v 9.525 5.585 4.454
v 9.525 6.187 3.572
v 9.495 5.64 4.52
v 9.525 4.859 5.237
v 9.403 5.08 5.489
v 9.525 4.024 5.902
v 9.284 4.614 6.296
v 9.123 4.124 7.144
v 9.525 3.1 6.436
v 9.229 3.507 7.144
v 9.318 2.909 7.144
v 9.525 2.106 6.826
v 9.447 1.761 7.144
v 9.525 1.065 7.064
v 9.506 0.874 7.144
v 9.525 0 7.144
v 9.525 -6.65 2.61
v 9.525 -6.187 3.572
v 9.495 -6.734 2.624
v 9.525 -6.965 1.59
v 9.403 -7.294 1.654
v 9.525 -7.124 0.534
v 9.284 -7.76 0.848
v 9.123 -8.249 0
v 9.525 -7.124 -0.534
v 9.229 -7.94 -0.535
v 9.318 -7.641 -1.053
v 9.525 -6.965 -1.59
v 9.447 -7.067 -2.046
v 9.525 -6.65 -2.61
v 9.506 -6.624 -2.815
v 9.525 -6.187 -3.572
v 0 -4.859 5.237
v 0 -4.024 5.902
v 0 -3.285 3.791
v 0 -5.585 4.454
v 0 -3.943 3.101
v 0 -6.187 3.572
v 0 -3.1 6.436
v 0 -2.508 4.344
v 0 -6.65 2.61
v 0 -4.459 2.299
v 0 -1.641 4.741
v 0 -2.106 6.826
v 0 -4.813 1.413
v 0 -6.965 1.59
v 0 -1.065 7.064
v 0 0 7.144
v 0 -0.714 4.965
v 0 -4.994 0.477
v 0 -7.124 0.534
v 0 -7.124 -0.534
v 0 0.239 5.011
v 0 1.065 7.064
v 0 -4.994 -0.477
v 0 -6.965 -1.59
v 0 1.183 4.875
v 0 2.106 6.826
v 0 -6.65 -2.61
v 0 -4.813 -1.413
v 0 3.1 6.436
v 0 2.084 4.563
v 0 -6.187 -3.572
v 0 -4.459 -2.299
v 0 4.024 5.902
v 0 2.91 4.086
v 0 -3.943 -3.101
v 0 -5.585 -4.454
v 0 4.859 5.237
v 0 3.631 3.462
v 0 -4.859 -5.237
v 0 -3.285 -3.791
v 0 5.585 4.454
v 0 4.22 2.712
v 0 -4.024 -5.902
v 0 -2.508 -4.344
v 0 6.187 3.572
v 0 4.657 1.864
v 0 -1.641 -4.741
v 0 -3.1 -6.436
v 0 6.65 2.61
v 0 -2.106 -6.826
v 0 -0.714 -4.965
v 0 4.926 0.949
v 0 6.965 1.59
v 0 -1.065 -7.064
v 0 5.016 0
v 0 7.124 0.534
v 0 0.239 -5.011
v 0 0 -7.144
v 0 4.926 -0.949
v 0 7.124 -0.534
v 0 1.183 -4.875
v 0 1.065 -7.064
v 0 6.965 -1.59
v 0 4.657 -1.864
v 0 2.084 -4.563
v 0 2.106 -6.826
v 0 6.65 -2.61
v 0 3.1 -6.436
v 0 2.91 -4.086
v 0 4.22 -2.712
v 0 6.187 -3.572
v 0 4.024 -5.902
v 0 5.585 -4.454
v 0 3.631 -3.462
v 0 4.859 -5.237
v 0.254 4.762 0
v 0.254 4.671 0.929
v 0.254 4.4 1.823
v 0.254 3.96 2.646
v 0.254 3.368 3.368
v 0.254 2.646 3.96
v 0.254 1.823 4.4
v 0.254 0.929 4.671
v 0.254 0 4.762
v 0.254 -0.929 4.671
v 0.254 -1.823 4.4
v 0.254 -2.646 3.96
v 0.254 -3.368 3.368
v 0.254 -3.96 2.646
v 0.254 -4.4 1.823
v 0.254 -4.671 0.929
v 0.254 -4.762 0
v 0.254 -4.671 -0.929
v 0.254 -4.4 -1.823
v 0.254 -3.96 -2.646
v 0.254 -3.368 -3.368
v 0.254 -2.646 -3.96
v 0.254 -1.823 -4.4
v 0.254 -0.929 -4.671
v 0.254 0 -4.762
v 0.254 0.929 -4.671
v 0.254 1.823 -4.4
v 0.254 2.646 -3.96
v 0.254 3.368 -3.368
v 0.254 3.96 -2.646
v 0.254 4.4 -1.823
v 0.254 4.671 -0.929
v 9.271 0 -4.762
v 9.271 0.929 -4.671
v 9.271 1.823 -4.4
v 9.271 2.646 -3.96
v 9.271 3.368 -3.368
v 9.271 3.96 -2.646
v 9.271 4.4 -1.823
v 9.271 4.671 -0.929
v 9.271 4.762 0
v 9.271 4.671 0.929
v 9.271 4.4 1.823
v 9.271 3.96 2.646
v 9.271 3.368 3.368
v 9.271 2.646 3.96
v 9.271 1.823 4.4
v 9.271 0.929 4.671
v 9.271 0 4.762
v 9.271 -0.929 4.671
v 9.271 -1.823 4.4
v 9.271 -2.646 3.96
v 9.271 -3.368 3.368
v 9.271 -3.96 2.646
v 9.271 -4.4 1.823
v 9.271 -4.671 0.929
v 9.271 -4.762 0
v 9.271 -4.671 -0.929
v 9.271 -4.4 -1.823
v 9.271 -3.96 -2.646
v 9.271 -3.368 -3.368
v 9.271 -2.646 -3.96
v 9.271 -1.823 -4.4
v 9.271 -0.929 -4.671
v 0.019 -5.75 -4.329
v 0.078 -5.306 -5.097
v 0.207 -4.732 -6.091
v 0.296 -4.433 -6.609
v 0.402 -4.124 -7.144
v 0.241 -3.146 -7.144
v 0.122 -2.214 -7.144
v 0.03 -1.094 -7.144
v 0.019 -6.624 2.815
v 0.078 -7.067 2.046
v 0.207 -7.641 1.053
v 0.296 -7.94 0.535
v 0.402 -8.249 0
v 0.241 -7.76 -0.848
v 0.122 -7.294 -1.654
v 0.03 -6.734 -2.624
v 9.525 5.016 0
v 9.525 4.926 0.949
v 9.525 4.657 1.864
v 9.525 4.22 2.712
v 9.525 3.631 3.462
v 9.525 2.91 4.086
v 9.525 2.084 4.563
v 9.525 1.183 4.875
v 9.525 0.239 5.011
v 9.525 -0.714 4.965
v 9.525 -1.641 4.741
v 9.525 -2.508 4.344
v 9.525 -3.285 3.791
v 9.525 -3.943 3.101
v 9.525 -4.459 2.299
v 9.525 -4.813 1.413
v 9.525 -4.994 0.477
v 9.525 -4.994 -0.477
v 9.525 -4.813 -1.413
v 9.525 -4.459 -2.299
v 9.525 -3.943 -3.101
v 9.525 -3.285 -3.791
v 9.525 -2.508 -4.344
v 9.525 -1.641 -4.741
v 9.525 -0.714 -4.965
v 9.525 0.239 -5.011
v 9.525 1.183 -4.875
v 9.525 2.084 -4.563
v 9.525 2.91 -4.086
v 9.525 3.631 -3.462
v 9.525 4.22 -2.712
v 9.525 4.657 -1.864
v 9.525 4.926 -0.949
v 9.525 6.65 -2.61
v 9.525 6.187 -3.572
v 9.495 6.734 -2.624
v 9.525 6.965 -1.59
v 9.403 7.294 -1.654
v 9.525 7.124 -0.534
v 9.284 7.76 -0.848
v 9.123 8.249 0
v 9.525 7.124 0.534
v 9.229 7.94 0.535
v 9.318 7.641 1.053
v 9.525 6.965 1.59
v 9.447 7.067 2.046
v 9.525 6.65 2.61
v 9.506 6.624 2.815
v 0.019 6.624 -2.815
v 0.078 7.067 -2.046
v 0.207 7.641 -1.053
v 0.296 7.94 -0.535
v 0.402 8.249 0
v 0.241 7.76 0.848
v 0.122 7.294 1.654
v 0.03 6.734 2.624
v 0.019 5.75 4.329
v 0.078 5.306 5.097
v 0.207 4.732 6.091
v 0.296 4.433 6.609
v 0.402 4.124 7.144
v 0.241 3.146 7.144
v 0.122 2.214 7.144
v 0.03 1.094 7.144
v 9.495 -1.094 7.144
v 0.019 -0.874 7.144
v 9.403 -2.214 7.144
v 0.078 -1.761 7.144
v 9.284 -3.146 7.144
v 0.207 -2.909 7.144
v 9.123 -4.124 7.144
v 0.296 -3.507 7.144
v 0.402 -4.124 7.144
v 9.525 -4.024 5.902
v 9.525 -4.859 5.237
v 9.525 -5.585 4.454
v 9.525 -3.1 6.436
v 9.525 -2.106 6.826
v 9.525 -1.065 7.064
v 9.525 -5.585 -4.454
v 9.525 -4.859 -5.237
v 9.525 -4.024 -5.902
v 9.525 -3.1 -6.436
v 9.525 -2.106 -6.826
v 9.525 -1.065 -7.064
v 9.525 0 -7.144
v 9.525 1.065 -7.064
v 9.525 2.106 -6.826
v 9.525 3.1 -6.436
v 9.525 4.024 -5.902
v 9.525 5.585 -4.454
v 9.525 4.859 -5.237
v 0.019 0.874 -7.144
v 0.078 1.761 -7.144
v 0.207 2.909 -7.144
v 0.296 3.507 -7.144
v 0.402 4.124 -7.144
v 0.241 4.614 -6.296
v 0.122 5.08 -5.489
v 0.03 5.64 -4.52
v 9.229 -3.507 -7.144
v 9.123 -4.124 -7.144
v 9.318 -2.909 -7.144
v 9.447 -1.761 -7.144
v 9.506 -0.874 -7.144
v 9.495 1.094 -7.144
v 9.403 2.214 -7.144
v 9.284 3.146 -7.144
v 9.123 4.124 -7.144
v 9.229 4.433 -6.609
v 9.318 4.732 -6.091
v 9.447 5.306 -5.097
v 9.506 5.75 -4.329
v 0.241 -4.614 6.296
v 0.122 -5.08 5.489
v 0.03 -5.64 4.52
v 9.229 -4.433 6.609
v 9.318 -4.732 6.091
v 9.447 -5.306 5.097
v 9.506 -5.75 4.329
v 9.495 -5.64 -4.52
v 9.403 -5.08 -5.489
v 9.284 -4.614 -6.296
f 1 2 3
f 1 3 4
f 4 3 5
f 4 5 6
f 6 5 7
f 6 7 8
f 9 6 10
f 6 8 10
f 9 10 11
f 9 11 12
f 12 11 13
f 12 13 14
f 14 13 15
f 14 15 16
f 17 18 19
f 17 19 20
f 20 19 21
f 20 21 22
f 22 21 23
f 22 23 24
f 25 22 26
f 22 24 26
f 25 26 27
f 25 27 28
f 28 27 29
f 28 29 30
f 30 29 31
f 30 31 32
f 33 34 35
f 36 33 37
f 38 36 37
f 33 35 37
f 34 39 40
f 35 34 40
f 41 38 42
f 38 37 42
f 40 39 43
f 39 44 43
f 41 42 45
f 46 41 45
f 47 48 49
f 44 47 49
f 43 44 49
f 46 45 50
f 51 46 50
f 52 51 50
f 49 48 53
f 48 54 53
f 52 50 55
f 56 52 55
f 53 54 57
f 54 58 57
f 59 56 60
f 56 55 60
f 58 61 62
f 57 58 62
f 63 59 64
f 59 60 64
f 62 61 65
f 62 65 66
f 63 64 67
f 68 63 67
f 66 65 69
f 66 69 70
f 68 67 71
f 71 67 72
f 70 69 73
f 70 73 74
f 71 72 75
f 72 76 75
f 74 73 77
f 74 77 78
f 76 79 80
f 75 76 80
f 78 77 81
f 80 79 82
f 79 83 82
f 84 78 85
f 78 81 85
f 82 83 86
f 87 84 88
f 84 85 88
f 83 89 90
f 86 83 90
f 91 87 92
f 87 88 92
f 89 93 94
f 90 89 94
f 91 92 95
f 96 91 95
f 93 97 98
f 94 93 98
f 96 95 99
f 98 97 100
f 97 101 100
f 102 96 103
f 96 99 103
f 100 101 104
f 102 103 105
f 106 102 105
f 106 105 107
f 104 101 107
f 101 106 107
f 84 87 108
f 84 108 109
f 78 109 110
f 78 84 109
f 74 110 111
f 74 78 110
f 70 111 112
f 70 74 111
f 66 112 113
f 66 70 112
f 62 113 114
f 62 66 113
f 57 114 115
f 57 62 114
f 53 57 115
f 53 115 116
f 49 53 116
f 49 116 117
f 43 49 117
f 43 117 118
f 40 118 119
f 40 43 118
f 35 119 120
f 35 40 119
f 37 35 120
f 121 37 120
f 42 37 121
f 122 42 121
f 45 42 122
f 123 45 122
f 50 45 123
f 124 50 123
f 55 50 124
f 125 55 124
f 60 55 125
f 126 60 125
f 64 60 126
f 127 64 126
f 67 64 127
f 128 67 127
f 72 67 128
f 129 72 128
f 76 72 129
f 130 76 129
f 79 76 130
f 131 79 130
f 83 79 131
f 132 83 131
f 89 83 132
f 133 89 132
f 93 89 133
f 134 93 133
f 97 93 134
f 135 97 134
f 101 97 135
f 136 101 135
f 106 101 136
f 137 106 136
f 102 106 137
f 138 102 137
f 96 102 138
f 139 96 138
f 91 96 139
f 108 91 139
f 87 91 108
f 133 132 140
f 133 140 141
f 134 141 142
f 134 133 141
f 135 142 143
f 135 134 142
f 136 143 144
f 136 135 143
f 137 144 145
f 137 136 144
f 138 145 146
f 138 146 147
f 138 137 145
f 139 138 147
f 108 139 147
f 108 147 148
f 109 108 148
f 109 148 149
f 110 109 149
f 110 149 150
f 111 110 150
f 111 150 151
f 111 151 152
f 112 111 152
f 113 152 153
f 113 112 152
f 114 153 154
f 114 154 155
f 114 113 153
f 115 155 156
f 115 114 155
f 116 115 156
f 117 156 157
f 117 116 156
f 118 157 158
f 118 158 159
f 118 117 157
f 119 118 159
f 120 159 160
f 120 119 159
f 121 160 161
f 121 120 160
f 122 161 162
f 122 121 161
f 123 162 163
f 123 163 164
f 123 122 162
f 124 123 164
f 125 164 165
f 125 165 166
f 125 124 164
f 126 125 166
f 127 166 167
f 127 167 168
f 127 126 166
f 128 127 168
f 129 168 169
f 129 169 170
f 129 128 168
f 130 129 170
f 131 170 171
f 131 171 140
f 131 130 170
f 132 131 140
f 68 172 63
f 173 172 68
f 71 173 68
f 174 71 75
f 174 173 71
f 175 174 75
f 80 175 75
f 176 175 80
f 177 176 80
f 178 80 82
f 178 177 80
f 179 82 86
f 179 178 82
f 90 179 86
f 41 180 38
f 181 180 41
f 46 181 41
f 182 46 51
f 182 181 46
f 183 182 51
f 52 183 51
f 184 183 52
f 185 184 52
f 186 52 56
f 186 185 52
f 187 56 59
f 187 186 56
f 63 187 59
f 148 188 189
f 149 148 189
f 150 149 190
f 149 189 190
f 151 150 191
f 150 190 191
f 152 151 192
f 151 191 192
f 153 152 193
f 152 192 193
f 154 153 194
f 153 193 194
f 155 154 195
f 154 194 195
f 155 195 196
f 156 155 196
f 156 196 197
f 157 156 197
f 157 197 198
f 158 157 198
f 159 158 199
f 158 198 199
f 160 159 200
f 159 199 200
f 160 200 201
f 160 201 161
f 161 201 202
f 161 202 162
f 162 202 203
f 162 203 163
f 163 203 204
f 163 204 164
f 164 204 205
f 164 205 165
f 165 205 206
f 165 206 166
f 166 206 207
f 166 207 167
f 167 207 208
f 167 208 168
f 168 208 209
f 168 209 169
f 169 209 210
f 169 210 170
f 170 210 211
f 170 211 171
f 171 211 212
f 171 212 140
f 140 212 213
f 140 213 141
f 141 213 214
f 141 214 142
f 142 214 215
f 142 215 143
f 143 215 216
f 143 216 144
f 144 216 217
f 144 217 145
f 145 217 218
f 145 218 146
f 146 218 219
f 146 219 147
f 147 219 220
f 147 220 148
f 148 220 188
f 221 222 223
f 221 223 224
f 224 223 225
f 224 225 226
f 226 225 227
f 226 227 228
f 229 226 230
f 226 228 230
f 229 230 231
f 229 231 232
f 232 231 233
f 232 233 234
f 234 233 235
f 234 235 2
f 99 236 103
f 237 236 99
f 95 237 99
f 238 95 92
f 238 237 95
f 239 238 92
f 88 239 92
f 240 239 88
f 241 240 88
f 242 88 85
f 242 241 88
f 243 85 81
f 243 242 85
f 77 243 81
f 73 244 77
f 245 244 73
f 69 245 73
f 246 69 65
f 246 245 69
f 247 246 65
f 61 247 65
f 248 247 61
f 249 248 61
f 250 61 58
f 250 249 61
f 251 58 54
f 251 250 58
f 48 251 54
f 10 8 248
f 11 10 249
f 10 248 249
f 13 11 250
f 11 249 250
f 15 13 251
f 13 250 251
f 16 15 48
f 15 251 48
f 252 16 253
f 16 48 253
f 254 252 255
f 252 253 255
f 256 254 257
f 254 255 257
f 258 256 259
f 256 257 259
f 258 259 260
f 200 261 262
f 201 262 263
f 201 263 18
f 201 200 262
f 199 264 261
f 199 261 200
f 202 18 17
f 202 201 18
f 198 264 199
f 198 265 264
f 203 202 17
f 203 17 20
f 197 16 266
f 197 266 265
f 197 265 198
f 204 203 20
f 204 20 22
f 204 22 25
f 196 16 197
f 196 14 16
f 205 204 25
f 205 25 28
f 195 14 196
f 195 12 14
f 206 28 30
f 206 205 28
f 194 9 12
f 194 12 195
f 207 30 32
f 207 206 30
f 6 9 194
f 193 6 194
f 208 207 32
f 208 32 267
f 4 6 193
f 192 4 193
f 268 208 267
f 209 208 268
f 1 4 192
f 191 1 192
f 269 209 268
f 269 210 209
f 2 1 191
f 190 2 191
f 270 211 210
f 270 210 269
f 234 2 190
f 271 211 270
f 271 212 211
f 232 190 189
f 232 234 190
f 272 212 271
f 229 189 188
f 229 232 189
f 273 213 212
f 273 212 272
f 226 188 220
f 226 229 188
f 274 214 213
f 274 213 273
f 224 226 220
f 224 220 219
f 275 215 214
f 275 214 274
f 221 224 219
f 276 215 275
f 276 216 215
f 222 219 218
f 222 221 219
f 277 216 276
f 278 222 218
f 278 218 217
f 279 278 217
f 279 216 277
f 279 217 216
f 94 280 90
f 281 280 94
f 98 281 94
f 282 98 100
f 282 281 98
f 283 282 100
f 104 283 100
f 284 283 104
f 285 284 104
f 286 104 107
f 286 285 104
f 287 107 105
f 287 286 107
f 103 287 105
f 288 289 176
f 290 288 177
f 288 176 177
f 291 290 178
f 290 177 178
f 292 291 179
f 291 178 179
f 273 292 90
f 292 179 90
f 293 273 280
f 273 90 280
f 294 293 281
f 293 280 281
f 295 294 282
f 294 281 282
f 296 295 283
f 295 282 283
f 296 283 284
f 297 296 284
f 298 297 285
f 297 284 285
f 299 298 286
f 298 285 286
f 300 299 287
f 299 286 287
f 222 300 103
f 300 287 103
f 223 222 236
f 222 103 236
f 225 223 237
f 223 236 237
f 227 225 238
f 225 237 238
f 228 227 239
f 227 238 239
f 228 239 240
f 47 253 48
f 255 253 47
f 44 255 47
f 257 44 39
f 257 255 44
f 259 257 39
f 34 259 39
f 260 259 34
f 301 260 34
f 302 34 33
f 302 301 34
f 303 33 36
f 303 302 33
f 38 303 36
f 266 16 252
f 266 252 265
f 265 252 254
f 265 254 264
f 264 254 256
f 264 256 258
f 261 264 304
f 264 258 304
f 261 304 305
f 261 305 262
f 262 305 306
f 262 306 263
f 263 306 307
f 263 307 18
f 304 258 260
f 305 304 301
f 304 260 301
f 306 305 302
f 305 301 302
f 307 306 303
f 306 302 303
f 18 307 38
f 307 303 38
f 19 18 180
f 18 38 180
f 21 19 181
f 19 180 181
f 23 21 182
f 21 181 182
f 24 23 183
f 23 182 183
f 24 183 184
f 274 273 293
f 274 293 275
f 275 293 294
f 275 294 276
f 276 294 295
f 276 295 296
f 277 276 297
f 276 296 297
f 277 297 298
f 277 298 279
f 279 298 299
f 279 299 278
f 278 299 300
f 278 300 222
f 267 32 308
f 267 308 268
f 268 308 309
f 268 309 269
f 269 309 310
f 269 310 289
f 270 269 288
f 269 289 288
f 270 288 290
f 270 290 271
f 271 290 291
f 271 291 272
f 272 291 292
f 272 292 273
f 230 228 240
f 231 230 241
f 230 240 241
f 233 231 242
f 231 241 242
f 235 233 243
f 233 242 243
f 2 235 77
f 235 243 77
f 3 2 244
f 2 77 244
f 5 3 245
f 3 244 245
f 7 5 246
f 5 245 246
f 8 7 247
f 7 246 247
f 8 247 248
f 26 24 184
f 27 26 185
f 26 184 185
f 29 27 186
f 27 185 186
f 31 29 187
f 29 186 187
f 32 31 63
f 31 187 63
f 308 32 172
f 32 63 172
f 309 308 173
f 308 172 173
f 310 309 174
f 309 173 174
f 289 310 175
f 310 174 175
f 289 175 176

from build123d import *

# Parameters (mm, degrees)
SKETCH1_R           = 4.7625
BOSS_EXTRUDE1_DEPTH = 9.525


with BuildPart() as part:
    # Sketch1 → Boss-Extrude1 (new body)
    with BuildSketch(Plane(origin=(0, 0, 0), x_dir=(0, 0, -1), z_dir=(1, 0, 0))):
        Polygon((0, 8.248891971), (-7.14375, 4.124445986), (-7.14375, -4.124445986), (0, -8.248891971), (7.14375, -4.124445986), (7.14375, 4.124445986), align=None)
        Circle(SKETCH1_R, mode=Mode.SUBTRACT)
    extrude(amount=BOSS_EXTRUDE1_DEPTH)

    # Sketch2 → Cut-Revolve1 (revolve, cut)
    with BuildSketch(Plane.XY):
        Polygon((0, 7.14375), (0.402238782, 8.248891971), (0, 8.248891971), align=None)
        Polygon((0, 4.7625), (0.254, 4.7625), (0, 5.0165), align=None)
        Polygon((9.525, 5.0165), (9.525, 4.7625), (9.271, 4.7625), align=None)
        Polygon((9.525, 8.248891971), (9.525, 7.14375), (9.122761218, 8.248891971), align=None)
    revolve(axis=Axis((0, 0, 0), (1, 0, 0)), mode=Mode.SUBTRACT)


solid = part.part
